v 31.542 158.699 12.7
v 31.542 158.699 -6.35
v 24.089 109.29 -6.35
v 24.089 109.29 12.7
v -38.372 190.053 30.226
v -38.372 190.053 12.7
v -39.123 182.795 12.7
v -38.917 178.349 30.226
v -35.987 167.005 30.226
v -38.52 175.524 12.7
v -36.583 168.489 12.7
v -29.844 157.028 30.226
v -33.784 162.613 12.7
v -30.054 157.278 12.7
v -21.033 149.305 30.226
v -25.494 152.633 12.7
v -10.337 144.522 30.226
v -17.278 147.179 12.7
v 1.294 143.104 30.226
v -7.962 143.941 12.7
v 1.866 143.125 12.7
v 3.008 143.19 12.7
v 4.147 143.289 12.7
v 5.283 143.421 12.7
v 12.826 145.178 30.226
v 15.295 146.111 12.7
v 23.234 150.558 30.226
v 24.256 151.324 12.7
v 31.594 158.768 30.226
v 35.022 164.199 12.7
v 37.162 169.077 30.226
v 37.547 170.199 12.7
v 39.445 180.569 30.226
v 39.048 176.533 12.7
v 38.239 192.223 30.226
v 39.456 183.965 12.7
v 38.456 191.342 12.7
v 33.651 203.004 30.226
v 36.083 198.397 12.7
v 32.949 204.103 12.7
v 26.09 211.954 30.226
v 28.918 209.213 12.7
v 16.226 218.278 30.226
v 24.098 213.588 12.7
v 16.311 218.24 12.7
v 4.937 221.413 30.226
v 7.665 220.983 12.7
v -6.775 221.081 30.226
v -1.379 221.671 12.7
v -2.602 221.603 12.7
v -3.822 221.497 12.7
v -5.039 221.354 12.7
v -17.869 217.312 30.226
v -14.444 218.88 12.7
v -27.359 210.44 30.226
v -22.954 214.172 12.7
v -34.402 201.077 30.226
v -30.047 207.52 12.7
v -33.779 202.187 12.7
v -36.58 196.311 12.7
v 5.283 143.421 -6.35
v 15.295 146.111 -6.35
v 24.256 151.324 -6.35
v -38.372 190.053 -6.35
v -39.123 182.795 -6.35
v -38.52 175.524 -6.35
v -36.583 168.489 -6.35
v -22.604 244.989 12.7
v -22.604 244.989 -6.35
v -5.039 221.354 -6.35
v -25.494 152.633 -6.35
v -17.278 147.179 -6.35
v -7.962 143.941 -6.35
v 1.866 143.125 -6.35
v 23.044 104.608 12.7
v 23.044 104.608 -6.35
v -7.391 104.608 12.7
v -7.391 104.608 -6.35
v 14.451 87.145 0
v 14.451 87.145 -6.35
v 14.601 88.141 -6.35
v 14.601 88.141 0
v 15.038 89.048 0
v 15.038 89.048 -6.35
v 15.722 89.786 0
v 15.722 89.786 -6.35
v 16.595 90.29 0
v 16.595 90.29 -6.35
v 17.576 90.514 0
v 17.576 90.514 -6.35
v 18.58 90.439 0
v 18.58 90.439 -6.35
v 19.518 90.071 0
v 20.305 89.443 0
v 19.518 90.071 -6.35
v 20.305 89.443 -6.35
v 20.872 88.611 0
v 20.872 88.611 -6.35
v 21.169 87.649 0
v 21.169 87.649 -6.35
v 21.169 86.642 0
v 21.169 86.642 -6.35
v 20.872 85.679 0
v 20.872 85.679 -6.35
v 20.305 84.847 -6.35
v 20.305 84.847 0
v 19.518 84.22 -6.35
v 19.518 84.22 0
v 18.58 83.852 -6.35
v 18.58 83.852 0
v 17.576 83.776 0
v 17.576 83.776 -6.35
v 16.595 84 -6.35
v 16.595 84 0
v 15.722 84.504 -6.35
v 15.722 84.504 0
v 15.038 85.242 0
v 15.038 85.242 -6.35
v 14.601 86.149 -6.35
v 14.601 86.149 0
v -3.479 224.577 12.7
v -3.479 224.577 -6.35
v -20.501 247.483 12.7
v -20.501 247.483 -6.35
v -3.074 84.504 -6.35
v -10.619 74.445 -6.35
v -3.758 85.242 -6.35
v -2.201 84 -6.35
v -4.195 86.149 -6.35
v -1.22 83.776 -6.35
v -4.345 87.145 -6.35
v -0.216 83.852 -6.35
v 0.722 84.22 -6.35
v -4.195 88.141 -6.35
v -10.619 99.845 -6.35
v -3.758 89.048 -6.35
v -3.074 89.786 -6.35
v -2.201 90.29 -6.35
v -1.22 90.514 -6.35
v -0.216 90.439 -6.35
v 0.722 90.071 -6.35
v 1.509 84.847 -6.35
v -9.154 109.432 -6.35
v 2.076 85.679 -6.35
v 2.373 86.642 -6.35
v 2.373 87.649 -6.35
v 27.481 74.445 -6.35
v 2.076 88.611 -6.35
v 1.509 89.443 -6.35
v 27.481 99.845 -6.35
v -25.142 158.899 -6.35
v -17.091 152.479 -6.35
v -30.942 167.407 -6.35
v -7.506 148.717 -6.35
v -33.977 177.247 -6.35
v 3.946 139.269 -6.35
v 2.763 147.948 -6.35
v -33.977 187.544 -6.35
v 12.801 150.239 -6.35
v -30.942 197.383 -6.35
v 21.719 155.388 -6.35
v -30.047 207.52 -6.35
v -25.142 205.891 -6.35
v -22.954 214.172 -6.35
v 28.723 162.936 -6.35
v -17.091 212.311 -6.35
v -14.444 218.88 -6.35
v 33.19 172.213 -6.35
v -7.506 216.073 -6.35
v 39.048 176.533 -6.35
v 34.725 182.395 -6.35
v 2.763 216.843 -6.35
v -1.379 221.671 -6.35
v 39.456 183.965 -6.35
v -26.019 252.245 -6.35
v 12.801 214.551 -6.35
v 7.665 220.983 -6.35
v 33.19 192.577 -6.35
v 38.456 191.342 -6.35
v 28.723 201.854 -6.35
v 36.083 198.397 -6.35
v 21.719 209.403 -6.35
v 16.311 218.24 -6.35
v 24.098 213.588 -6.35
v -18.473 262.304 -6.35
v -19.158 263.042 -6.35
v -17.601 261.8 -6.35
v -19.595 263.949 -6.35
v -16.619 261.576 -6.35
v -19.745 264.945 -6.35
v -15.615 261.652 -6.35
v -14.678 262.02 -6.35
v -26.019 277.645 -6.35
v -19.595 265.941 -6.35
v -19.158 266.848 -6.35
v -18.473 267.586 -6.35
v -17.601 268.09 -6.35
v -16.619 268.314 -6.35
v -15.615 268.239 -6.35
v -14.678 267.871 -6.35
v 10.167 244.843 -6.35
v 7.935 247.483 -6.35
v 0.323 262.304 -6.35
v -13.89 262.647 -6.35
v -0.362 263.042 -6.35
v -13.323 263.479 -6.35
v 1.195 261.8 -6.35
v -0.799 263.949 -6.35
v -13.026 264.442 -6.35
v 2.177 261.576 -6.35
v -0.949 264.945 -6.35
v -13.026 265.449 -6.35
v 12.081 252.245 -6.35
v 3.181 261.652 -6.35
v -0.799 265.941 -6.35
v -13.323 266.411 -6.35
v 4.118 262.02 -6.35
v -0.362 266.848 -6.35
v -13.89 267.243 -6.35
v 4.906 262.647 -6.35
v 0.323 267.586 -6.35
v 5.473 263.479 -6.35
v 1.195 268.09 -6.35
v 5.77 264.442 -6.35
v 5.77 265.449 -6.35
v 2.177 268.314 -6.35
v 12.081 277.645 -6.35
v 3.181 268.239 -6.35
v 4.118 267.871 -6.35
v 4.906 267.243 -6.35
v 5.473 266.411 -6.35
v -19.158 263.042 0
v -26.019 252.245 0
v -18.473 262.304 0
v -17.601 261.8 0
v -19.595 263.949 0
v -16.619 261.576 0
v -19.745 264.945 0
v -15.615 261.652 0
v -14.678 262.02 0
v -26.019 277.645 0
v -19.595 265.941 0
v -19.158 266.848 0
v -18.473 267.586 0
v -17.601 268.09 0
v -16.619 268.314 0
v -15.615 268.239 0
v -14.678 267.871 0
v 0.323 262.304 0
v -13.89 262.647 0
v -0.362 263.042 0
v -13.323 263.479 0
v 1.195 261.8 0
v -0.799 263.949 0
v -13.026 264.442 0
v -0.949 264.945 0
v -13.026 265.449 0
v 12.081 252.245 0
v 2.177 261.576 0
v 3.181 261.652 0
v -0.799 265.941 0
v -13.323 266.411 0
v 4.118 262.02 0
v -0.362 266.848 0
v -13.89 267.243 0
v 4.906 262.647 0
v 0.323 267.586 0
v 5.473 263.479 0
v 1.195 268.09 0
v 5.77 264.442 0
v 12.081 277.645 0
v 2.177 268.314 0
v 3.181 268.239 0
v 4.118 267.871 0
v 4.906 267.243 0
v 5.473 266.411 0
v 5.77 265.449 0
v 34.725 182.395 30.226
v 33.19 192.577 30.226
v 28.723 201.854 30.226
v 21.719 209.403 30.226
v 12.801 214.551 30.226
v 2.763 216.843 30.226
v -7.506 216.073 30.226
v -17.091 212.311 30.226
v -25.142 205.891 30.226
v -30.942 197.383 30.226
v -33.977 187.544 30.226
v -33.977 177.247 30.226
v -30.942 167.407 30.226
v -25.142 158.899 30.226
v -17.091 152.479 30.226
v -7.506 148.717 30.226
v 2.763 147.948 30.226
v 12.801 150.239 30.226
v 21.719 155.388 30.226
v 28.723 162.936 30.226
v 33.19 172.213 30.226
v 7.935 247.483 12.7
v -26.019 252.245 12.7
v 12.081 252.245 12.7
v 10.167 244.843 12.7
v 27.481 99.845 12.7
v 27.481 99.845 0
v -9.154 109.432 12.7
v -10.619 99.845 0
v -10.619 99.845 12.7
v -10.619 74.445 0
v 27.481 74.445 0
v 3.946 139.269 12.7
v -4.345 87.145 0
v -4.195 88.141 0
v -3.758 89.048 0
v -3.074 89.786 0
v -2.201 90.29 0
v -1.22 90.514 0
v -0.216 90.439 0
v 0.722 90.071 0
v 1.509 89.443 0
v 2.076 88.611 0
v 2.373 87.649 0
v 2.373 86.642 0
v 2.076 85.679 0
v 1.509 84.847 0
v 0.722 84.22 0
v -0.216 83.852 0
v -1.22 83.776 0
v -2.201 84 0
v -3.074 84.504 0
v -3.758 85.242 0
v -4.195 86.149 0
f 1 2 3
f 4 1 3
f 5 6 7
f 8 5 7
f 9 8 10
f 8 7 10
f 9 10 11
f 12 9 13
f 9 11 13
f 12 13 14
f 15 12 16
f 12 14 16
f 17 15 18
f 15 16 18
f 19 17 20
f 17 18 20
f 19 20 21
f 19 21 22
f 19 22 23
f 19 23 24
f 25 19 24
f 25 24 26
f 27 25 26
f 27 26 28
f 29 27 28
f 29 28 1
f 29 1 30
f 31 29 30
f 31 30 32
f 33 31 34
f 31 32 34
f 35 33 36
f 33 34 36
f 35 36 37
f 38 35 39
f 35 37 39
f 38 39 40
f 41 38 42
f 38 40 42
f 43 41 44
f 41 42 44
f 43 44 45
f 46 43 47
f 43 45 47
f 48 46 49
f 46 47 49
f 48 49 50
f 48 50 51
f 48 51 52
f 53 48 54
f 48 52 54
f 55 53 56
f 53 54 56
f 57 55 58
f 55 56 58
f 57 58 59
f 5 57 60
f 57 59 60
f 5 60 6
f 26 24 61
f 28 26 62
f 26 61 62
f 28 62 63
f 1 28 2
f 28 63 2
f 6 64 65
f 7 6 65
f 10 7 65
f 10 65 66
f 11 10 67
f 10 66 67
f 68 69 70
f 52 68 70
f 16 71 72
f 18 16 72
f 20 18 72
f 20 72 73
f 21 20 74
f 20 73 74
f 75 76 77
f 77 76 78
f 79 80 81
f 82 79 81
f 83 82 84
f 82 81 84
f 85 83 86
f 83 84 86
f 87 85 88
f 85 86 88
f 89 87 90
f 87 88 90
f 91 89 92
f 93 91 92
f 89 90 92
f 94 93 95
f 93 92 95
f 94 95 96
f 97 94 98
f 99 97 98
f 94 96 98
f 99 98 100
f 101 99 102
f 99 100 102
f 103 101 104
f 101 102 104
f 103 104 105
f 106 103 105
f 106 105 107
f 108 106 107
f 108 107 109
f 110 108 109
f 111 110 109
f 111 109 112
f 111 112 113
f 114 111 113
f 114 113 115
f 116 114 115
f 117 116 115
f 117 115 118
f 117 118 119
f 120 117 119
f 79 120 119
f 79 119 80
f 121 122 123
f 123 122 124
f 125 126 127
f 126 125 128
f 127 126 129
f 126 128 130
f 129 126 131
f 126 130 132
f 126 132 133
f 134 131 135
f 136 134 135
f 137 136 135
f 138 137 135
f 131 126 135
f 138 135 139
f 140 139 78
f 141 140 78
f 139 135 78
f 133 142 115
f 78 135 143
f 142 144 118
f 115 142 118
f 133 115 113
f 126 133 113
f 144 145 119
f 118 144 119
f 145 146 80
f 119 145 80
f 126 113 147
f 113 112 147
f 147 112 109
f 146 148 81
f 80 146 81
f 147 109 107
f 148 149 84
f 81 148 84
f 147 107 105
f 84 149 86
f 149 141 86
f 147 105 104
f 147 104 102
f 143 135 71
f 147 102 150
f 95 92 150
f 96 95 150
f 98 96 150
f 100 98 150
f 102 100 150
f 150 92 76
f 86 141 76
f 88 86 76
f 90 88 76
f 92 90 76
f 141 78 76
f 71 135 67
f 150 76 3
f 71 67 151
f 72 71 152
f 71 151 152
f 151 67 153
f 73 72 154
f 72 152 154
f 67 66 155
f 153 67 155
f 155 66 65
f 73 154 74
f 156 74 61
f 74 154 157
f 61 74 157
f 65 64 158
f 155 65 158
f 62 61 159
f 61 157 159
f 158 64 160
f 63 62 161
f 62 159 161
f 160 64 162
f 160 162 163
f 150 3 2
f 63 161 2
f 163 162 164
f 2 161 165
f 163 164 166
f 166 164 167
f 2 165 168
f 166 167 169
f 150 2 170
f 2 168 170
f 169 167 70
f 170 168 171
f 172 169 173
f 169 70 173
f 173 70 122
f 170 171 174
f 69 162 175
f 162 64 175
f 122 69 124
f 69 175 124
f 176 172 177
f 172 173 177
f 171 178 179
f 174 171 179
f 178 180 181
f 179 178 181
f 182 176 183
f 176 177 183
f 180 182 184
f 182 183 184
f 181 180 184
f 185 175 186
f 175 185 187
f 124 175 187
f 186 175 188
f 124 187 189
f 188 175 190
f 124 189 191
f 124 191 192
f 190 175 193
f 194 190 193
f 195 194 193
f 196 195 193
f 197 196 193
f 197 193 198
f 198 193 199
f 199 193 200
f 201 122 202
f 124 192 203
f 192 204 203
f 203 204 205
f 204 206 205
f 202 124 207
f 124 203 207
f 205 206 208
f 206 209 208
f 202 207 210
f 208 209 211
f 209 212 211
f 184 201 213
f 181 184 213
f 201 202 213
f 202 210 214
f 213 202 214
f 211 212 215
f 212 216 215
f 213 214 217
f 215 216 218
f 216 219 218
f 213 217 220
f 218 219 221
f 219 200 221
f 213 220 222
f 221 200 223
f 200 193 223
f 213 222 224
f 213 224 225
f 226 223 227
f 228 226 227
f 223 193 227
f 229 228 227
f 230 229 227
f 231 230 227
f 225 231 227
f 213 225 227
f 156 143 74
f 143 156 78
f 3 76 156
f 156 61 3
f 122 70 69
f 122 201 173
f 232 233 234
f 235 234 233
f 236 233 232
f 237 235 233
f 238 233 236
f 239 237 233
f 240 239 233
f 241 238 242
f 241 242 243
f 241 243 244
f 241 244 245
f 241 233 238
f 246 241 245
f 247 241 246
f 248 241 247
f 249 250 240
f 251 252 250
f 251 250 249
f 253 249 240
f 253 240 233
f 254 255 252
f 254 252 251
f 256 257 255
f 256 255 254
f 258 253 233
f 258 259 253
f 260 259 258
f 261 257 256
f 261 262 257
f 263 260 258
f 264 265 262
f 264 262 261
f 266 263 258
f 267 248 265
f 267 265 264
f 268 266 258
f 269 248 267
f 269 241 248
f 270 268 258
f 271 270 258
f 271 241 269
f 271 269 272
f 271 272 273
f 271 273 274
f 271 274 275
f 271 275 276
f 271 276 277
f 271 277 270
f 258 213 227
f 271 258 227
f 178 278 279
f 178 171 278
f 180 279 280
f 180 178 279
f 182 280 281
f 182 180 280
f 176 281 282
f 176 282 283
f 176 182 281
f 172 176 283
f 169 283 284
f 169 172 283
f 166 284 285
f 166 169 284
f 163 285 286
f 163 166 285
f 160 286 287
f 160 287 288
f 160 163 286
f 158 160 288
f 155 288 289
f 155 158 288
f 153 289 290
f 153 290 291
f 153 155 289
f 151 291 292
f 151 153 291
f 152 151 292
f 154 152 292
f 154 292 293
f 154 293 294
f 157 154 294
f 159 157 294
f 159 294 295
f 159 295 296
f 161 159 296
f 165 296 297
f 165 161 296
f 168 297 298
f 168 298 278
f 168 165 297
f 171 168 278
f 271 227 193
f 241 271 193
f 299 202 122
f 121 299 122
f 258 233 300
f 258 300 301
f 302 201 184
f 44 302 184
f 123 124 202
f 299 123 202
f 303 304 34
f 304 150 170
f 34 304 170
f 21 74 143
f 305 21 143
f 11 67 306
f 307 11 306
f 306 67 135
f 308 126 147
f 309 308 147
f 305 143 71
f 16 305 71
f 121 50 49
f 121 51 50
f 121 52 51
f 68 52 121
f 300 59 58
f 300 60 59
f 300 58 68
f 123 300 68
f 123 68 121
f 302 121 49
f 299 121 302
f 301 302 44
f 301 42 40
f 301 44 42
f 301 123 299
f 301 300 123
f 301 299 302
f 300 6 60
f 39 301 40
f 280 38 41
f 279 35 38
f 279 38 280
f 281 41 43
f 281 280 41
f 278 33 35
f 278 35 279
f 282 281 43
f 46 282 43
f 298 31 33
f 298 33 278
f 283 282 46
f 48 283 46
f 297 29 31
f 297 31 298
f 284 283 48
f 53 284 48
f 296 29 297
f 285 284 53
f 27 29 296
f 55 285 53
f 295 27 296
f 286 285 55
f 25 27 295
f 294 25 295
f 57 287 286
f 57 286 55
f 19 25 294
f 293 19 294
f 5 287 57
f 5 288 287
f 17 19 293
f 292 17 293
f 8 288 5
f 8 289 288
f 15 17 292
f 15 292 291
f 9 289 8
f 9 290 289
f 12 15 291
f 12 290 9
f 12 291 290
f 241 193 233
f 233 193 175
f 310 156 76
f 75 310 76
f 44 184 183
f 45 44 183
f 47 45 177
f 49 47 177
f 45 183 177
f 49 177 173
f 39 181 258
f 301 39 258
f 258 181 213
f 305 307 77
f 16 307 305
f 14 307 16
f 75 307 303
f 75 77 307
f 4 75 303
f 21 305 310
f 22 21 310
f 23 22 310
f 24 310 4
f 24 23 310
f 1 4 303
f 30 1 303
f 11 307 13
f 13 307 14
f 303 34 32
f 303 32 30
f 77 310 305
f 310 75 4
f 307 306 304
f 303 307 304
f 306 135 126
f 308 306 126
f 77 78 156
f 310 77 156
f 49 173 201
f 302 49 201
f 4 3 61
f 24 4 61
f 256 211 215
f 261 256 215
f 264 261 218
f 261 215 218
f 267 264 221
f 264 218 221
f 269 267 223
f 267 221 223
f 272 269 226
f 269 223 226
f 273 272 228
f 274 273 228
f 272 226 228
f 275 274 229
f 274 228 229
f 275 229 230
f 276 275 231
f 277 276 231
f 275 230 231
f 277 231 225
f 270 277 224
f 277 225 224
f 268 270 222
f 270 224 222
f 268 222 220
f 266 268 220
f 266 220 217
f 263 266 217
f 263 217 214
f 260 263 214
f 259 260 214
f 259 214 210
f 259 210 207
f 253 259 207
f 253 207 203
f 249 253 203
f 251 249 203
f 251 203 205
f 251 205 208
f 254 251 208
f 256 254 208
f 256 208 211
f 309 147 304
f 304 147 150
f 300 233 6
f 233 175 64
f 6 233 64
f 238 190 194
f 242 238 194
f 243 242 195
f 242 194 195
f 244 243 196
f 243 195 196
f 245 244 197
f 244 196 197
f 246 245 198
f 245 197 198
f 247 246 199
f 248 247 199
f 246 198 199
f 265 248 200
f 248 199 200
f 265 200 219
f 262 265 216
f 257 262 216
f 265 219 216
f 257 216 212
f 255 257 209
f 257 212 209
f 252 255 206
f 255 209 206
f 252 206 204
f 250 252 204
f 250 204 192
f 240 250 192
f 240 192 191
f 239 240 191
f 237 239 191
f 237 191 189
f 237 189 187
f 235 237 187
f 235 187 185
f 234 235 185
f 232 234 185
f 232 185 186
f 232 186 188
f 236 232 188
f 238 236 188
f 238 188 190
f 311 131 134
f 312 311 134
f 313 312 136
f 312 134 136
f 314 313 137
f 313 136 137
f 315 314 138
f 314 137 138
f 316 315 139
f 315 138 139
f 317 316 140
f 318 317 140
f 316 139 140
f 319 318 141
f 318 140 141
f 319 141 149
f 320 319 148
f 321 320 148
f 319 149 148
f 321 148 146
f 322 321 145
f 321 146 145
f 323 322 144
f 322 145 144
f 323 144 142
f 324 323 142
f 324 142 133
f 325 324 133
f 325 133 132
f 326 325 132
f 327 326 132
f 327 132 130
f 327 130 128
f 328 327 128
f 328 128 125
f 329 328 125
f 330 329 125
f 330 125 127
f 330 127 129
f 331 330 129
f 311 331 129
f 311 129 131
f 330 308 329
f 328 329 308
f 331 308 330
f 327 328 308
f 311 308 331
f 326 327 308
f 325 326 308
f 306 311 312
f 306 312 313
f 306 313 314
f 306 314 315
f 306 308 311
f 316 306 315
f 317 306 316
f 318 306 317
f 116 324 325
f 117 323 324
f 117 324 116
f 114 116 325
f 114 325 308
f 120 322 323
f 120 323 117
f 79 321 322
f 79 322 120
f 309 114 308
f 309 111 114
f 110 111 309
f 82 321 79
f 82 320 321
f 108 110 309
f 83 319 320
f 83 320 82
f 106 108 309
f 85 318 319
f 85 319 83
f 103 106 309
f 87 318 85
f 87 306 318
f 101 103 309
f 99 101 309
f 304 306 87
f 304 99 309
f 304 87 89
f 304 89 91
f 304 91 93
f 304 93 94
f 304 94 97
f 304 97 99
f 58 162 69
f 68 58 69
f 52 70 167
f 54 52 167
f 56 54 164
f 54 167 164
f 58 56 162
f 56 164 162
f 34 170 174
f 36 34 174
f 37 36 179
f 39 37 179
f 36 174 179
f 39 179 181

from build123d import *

# Parameters (mm, degrees)
MAIN_START                  = -6.35
MAIN_BODY_EXTRUDE_OUTLINE_R = 34.544
MAIN_BODY_EXTRUDE_DEPTH     = 19.05
A_START                     = -12.7
SKETCH3_W                   = 38.1
SKETCH3_H                   = 25.4
A_ARM_CUT_EXTRUDE_DEPTH     = 12.7
SKETCH2_R                   = 39.3065
SKETCH2_R_2                 = 34.544
WHEEL_BEARING_EXTRUDE_DEPTH = 17.526
F_1_4_CLEARANCE_HOLE1_D     = 6.7564


# Read off the part's stored shape, not the designer's step: Main Body Extrude
with BuildPart() as part:
    # Main Body Extrude outline → Main Body Extrude (new body)
    with BuildSketch(Plane.XY.offset(MAIN_START)):
        with BuildLine():
            Line((27.480731972, 99.845136477), (39.047879642, 176.532662304))
            ThreePointArc((39.047879642, 176.532662304), (39.130976131, 187.677399272), (36.082648081, 198.397462855))
            Line((36.082648081, 198.397462855), (12.081280182, 252.245136477))
            Line((12.081280182, 252.245136477), (12.081280182, 277.645136477))
            Line((12.081280182, 277.645136477), (-26.018719818, 277.645136477))
            Line((-26.018719818, 277.645136477), (-26.018719818, 252.245136477))
            Line((-26.018719818, 252.245136477), (-38.372251652, 190.053187868))
            ThreePointArc((-38.372251652, 190.053187868), (-38.990928758, 179.14568581), (-36.583444609, 168.489214415))
            Line((-36.583444609, 168.489214415), (-10.619268028, 99.845136477))
            Line((-10.619268028, 99.845136477), (-10.619268028, 74.445136477))
            Line((-10.619268028, 74.445136477), (27.480731972, 74.445136477))
            Line((27.480731972, 74.445136477), (27.480731972, 99.845136477))
        make_face()
        with BuildLine():
            ThreePointArc((-25.494117557, 152.632946315), (-12.721668299, 145.266691439), (1.866319763, 143.124782188))
            Line((1.866319763, 143.124782188), (-9.153762694, 109.432323748))
            Line((-9.153762694, 109.432323748), (-25.494117557, 152.632946315))
        make_face(mode=Mode.SUBTRACT)
        Polygon((-7.391297603, 104.607636477), (3.945650004, 139.268868599), (23.044050934, 104.607636477), align=None, mode=Mode.SUBTRACT)
        with BuildLine():
            ThreePointArc((5.282813212, 143.421136093), (19.947813793, 148.420513168), (31.541530581, 158.698730145))
            Line((31.541530581, 158.698730145), (24.089008073, 109.290221793))
            Line((24.089008073, 109.290221793), (5.282813212, 143.421136093))
        make_face(mode=Mode.SUBTRACT)
        with BuildLine():
            ThreePointArc((-5.038778466, 221.353506402), (-18.844806738, 216.790174549), (-30.047186356, 207.519947737))
            Line((-30.047186356, 207.519947737), (-22.604404483, 244.989483896))
            Line((-22.604404483, 244.989483896), (-5.038778466, 221.353506402))
        make_face(mode=Mode.SUBTRACT)
        Polygon((-3.478576257, 224.576955104), (-20.501465739, 247.482636477), (7.934620863, 247.482636477), align=None, mode=Mode.SUBTRACT)
        with Locations((0.181025656, 182.395136477)):
            Circle(MAIN_BODY_EXTRUDE_OUTLINE_R, mode=Mode.SUBTRACT)
        with BuildLine():
            Line((-1.379394493, 221.670650875), (10.166551929, 244.842753057))
            Line((10.166551929, 244.842753057), (24.09762487, 213.588039906))
            ThreePointArc((24.09762487, 213.588039906), (12.067229239, 219.861376035), (-1.379394493, 221.670650875))
        make_face(mode=Mode.SUBTRACT)
    extrude(amount=MAIN_BODY_EXTRUDE_DEPTH)

    # Sketch3 → A Arm Cut Extrude (cut)
    with BuildSketch(Plane.XY.offset(12.7).offset(A_START)):
        with Locations((-6.968719818, 264.945136477)):
            Rectangle(SKETCH3_W, SKETCH3_H)
        with Locations((8.430731972, 87.145136477)):
            Rectangle(SKETCH3_W, SKETCH3_H)
    extrude(amount=A_ARM_CUT_EXTRUDE_DEPTH, mode=Mode.SUBTRACT)

    # Sketch2 → Wheel Bearing Extrude (add)
    with BuildSketch(Plane.XY.offset(12.7)):
        with Locations(Location((0.181025656, 182.395136477, 0), (0, 0, 168.765257697))):
            Circle(SKETCH2_R)
        with Locations((0.181025656, 182.395136477)):
            Circle(SKETCH2_R_2, mode=Mode.SUBTRACT)
    extrude(amount=WHEEL_BEARING_EXTRUDE_DEPTH)

    # 1/4 Clearance Hole1 (through all)
    with Locations(Plane(origin=(-16.366719818, 264.945136477, 0), x_dir=(1, 0, 0), z_dir=(0, 0, 1))):
        with Locations((0, 0), (18.796, 0), (15.39945179, -177.8), (34.19545179, -177.8)):
            Hole(F_1_4_CLEARANCE_HOLE1_D / 2)


solid = part.part
